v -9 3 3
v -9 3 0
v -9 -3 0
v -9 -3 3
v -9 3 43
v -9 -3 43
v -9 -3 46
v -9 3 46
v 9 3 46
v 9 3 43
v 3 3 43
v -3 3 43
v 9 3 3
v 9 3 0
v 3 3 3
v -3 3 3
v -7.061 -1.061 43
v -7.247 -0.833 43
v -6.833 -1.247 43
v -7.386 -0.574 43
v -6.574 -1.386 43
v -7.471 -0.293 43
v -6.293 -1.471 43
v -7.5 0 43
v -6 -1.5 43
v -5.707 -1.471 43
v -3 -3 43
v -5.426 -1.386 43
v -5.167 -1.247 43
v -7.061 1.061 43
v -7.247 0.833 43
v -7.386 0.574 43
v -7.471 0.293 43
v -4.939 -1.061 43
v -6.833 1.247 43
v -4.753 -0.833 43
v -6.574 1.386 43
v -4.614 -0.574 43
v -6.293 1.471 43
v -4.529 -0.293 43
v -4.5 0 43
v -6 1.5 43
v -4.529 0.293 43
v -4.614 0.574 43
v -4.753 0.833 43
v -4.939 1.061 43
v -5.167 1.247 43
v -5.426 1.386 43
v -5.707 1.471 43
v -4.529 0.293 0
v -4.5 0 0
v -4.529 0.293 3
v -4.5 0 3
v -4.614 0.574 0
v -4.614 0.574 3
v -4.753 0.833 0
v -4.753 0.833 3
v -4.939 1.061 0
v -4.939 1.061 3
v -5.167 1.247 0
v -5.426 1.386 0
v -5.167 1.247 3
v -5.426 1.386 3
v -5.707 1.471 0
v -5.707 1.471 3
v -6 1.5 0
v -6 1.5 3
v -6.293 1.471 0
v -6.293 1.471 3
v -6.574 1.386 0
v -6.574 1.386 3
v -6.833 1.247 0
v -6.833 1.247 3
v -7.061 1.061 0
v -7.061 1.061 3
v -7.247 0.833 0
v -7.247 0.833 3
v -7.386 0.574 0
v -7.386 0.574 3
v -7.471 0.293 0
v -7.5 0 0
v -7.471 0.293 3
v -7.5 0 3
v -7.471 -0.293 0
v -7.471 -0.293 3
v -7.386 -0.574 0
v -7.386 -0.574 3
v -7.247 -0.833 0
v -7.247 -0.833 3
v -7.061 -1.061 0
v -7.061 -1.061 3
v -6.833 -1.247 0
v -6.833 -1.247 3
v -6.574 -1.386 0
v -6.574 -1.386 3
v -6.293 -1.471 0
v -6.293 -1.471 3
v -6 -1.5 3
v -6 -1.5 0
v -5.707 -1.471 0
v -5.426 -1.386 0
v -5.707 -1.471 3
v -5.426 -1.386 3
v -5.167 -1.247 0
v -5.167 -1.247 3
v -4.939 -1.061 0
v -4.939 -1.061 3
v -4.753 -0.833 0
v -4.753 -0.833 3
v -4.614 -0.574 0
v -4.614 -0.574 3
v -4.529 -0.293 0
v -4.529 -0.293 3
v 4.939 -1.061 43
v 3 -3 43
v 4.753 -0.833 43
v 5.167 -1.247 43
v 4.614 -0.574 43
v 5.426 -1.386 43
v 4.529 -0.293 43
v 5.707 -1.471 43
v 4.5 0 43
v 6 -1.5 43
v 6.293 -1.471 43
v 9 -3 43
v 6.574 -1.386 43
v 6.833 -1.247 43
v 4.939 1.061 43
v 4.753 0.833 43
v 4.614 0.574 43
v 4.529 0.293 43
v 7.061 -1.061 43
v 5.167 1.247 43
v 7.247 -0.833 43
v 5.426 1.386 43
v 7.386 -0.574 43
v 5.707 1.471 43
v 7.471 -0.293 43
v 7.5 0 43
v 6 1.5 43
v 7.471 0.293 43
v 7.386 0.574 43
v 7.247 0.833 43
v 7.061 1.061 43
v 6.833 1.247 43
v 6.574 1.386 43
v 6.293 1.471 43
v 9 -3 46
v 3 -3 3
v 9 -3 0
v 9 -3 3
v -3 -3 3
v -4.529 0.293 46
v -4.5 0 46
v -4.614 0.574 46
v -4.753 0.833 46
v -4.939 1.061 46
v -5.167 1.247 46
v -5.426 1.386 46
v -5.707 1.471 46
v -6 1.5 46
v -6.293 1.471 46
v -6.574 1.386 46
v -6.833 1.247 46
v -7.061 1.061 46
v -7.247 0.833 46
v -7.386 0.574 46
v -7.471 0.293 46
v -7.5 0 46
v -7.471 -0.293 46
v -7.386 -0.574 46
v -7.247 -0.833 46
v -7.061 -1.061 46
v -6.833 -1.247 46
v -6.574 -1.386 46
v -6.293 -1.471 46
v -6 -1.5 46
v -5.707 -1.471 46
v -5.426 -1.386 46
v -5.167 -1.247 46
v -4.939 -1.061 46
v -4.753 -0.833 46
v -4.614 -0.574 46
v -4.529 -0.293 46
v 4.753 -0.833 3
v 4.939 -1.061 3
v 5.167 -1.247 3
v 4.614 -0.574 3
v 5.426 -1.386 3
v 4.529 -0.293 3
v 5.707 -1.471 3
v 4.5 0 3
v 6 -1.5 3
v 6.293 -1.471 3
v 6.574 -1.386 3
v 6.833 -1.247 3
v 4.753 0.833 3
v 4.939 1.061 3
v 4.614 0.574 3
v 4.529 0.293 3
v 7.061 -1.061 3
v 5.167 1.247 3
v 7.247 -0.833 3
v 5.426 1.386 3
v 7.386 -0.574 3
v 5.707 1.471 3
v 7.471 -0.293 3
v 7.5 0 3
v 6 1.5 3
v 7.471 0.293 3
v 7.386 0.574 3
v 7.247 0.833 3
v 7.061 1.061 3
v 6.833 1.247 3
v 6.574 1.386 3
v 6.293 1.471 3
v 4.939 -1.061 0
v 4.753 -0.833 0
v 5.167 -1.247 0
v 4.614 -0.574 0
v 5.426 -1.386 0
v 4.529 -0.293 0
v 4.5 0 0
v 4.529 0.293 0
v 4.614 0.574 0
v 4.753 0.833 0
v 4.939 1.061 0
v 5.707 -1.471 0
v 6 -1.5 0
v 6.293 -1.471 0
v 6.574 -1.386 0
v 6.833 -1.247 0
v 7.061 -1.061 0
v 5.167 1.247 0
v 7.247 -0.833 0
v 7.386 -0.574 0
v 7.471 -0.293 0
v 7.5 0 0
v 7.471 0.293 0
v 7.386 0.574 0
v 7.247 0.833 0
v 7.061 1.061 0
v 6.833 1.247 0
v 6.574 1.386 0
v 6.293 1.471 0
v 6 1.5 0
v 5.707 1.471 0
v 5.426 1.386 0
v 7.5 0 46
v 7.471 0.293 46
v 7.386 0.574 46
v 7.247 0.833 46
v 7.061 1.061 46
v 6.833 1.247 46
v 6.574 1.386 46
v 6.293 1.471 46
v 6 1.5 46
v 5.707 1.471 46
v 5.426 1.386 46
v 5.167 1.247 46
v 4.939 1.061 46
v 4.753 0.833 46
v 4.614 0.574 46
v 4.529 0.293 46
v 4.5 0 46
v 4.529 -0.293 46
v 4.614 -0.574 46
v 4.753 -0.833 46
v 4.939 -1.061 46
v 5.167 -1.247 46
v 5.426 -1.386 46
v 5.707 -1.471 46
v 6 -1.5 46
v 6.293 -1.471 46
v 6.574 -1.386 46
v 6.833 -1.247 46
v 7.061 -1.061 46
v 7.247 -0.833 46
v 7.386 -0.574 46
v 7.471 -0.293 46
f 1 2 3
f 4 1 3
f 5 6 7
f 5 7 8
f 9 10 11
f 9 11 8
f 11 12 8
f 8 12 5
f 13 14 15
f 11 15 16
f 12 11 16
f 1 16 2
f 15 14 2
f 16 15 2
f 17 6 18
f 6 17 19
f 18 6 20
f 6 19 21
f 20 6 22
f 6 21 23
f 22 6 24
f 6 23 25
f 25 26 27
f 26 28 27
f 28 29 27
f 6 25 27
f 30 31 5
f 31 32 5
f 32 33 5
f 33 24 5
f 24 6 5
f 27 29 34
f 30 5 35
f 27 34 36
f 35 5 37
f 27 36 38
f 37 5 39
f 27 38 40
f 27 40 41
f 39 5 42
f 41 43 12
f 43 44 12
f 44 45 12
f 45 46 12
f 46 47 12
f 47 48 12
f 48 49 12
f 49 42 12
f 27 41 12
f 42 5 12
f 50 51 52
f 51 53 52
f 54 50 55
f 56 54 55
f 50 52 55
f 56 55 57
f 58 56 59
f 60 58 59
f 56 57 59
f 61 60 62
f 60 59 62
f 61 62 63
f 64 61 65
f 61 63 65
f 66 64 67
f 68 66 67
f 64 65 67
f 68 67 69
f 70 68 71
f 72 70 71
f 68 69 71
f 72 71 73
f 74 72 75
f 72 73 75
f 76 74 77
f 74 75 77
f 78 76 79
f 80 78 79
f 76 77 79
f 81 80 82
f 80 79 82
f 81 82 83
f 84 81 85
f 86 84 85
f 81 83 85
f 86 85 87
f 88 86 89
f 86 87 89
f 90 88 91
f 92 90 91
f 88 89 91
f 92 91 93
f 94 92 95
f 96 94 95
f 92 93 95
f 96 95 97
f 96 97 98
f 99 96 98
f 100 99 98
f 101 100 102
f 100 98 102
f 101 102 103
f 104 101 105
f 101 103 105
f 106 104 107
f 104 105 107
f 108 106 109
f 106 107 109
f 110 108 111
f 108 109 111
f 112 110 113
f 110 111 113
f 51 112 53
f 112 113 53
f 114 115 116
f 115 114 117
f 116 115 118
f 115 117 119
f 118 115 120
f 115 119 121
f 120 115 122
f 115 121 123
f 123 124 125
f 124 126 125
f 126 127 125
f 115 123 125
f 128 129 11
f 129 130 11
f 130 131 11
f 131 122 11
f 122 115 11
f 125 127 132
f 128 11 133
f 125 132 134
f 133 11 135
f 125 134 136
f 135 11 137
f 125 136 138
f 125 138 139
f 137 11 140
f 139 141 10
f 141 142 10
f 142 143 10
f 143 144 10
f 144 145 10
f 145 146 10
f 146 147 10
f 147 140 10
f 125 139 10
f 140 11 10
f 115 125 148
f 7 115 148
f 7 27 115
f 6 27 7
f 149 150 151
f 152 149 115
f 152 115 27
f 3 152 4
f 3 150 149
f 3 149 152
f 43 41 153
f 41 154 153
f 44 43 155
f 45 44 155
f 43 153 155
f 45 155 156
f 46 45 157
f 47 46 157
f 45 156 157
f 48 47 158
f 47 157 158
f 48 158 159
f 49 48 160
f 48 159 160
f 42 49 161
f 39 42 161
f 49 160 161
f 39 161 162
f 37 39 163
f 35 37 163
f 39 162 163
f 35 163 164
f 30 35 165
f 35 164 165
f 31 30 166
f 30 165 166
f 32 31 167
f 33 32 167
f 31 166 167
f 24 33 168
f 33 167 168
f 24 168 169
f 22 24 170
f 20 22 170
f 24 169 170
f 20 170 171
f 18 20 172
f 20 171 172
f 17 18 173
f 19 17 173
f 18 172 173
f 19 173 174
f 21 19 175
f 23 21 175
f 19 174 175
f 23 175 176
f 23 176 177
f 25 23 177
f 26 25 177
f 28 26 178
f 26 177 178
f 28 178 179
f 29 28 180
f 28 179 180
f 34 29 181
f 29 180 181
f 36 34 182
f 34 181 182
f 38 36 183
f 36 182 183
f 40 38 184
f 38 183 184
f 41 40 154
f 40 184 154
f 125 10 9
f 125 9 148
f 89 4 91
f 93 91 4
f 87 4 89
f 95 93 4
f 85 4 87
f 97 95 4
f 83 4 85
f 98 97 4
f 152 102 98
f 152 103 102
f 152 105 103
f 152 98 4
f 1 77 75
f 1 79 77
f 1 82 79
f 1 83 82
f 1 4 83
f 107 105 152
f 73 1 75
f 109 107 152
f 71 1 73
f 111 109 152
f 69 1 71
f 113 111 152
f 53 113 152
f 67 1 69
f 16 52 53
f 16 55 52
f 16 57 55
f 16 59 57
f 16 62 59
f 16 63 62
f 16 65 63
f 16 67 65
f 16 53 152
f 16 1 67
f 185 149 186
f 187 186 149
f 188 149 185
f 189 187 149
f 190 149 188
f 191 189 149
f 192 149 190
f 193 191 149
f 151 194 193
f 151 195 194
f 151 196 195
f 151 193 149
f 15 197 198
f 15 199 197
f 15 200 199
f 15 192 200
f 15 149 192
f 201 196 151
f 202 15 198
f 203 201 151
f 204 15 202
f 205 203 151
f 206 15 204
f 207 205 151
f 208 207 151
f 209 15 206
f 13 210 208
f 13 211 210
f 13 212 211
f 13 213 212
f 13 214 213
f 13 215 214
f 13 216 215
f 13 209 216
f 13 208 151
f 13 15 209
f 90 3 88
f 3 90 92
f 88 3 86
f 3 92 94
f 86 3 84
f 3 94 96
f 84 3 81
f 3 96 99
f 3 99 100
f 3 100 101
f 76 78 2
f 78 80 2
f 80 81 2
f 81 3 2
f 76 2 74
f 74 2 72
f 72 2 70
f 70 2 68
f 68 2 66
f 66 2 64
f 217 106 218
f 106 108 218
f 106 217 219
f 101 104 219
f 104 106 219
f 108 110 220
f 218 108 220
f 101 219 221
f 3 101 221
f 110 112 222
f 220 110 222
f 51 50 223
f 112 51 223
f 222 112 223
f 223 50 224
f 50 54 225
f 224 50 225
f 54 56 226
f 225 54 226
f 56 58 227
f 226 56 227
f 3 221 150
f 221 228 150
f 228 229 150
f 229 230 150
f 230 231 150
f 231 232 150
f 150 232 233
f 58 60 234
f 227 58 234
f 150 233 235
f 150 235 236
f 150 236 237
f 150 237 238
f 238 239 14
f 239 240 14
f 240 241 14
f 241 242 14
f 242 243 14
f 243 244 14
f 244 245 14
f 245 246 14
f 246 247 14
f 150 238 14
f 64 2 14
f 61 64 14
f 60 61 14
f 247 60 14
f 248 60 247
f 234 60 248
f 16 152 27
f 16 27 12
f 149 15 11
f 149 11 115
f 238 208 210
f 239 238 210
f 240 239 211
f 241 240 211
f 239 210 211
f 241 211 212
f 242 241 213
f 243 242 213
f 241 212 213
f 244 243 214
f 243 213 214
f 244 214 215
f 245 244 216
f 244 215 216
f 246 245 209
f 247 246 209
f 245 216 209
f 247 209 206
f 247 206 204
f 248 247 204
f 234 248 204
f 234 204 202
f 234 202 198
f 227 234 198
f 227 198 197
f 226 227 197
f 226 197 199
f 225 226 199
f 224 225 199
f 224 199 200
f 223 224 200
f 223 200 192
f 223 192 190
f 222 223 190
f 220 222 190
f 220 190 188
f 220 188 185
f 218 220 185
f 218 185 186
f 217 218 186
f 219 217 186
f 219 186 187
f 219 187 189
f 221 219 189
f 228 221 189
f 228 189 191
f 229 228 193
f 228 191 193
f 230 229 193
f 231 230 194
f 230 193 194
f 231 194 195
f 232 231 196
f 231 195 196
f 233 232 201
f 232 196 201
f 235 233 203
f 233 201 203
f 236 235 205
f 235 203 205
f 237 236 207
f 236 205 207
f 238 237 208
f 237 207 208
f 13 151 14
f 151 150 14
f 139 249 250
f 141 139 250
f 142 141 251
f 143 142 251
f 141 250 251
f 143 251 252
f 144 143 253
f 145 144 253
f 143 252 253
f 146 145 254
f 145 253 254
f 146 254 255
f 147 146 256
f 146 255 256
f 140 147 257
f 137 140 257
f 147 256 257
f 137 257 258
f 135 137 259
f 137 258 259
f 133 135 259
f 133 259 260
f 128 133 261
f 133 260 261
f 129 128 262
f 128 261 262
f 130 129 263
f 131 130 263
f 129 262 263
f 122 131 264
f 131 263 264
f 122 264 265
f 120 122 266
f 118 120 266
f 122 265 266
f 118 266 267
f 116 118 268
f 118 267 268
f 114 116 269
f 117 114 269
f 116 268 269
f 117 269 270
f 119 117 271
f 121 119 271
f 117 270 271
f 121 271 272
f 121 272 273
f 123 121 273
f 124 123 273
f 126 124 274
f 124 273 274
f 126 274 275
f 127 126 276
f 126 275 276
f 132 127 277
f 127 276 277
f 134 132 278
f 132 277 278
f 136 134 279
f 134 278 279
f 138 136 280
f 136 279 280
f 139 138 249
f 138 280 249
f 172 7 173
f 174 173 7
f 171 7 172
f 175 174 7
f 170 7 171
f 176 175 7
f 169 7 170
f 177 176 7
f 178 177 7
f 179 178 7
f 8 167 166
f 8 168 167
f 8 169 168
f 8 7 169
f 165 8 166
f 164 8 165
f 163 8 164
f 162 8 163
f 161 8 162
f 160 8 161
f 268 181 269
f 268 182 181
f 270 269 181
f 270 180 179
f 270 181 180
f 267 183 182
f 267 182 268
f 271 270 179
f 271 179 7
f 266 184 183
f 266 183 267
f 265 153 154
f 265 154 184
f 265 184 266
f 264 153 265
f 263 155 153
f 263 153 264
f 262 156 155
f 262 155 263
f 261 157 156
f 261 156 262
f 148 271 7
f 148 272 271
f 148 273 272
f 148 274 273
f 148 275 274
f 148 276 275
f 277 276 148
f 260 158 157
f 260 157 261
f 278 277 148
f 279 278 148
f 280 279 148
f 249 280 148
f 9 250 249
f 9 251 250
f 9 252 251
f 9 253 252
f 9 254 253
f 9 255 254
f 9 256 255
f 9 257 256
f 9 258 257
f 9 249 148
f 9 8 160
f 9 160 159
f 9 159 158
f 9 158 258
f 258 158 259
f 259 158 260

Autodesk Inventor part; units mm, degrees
ref_plane "YZ Plane" through (0, 0, 0) normal (1, 0, 0) x (0, 1, 0)
ref_plane "XZ Plane" through (0, 0, 0) normal (0, 1, 0) x (-1, 0, 0)
ref_plane "XY Plane" through (0, 0, 0) normal (0, 0, 1) x (1, 0, 0)
sketch "Sketch1" plane through (0, 0, 0) normal (0, 0, 1) x (1, 0, 0)
  line L0 (-9, -3) -> (9, -3)
  line L1 (9, -3) -> (9, 3)
  line L2 (9, 3) -> (-9, 3)
  line L3 (-9, 3) -> (-9, -3)
  line L4 (-9, -3) -> (9, 3) construction
  line L5 (9, -3) -> (-9, 3) construction
  point P0 (0, 0)
  dimension "d0" = 18
  dimension "d1" = 6
extrude "Extrusion1" add sketch "Sketch1" along normal blind 3
sketch "Sketch2" plane through (0, 0, 3) normal (0, 0, 1) x (1, 0, 0)
  line L0 (-3, 3) -> (3, 3)
  line L1 (3, 3) -> (3, -3)
  line L2 (3, -3) -> (-3, -3)
  line L3 (-3, -3) -> (-3, 3)
  line L4 (-3, 3) -> (3, -3) construction
  line L5 (3, 3) -> (-3, -3) construction
  point P0 (0, 0)
  dimension "d4" = 6
  dimension "d5" = 6
extrude "Extrusion2" add sketch "Sketch2" along normal blind 40
sketch "Sketch3" plane through (0, 0, 43) normal (0, 0, 1) x (1, 0, 0)
  line L0 (9, 3) -> (-9, 3) projected
  line L1 (9, -3) -> (-9, -3)
  line L2 (-9, -3) -> (-9, 3)
  line L3 (-9, 3) -> (9, 3)
  line L4 (9, 3) -> (9, -3)
  line L5 (9, -3) -> (-9, 3) construction
  line L6 (-9, -3) -> (9, 3) construction
  point P0 (0, 0)
extrude "Extrusion3" add sketch "Sketch3" along normal blind 3
sketch "Sketch4" plane through (0, 0, 46) normal (0, 0, 1) x (1, 0, 0)
  circle A0 centre (6, 0) radius 1.5
  circle A1 centre (-6, 0) radius 1.5
  point P0 (0, 0)
  dimension "d10" = 3
  dimension "d11" = 3
extrude "Extrusion4" cut sketch "Sketch4" against normal up to surface (46 mm away)
properties part number "shaft"
